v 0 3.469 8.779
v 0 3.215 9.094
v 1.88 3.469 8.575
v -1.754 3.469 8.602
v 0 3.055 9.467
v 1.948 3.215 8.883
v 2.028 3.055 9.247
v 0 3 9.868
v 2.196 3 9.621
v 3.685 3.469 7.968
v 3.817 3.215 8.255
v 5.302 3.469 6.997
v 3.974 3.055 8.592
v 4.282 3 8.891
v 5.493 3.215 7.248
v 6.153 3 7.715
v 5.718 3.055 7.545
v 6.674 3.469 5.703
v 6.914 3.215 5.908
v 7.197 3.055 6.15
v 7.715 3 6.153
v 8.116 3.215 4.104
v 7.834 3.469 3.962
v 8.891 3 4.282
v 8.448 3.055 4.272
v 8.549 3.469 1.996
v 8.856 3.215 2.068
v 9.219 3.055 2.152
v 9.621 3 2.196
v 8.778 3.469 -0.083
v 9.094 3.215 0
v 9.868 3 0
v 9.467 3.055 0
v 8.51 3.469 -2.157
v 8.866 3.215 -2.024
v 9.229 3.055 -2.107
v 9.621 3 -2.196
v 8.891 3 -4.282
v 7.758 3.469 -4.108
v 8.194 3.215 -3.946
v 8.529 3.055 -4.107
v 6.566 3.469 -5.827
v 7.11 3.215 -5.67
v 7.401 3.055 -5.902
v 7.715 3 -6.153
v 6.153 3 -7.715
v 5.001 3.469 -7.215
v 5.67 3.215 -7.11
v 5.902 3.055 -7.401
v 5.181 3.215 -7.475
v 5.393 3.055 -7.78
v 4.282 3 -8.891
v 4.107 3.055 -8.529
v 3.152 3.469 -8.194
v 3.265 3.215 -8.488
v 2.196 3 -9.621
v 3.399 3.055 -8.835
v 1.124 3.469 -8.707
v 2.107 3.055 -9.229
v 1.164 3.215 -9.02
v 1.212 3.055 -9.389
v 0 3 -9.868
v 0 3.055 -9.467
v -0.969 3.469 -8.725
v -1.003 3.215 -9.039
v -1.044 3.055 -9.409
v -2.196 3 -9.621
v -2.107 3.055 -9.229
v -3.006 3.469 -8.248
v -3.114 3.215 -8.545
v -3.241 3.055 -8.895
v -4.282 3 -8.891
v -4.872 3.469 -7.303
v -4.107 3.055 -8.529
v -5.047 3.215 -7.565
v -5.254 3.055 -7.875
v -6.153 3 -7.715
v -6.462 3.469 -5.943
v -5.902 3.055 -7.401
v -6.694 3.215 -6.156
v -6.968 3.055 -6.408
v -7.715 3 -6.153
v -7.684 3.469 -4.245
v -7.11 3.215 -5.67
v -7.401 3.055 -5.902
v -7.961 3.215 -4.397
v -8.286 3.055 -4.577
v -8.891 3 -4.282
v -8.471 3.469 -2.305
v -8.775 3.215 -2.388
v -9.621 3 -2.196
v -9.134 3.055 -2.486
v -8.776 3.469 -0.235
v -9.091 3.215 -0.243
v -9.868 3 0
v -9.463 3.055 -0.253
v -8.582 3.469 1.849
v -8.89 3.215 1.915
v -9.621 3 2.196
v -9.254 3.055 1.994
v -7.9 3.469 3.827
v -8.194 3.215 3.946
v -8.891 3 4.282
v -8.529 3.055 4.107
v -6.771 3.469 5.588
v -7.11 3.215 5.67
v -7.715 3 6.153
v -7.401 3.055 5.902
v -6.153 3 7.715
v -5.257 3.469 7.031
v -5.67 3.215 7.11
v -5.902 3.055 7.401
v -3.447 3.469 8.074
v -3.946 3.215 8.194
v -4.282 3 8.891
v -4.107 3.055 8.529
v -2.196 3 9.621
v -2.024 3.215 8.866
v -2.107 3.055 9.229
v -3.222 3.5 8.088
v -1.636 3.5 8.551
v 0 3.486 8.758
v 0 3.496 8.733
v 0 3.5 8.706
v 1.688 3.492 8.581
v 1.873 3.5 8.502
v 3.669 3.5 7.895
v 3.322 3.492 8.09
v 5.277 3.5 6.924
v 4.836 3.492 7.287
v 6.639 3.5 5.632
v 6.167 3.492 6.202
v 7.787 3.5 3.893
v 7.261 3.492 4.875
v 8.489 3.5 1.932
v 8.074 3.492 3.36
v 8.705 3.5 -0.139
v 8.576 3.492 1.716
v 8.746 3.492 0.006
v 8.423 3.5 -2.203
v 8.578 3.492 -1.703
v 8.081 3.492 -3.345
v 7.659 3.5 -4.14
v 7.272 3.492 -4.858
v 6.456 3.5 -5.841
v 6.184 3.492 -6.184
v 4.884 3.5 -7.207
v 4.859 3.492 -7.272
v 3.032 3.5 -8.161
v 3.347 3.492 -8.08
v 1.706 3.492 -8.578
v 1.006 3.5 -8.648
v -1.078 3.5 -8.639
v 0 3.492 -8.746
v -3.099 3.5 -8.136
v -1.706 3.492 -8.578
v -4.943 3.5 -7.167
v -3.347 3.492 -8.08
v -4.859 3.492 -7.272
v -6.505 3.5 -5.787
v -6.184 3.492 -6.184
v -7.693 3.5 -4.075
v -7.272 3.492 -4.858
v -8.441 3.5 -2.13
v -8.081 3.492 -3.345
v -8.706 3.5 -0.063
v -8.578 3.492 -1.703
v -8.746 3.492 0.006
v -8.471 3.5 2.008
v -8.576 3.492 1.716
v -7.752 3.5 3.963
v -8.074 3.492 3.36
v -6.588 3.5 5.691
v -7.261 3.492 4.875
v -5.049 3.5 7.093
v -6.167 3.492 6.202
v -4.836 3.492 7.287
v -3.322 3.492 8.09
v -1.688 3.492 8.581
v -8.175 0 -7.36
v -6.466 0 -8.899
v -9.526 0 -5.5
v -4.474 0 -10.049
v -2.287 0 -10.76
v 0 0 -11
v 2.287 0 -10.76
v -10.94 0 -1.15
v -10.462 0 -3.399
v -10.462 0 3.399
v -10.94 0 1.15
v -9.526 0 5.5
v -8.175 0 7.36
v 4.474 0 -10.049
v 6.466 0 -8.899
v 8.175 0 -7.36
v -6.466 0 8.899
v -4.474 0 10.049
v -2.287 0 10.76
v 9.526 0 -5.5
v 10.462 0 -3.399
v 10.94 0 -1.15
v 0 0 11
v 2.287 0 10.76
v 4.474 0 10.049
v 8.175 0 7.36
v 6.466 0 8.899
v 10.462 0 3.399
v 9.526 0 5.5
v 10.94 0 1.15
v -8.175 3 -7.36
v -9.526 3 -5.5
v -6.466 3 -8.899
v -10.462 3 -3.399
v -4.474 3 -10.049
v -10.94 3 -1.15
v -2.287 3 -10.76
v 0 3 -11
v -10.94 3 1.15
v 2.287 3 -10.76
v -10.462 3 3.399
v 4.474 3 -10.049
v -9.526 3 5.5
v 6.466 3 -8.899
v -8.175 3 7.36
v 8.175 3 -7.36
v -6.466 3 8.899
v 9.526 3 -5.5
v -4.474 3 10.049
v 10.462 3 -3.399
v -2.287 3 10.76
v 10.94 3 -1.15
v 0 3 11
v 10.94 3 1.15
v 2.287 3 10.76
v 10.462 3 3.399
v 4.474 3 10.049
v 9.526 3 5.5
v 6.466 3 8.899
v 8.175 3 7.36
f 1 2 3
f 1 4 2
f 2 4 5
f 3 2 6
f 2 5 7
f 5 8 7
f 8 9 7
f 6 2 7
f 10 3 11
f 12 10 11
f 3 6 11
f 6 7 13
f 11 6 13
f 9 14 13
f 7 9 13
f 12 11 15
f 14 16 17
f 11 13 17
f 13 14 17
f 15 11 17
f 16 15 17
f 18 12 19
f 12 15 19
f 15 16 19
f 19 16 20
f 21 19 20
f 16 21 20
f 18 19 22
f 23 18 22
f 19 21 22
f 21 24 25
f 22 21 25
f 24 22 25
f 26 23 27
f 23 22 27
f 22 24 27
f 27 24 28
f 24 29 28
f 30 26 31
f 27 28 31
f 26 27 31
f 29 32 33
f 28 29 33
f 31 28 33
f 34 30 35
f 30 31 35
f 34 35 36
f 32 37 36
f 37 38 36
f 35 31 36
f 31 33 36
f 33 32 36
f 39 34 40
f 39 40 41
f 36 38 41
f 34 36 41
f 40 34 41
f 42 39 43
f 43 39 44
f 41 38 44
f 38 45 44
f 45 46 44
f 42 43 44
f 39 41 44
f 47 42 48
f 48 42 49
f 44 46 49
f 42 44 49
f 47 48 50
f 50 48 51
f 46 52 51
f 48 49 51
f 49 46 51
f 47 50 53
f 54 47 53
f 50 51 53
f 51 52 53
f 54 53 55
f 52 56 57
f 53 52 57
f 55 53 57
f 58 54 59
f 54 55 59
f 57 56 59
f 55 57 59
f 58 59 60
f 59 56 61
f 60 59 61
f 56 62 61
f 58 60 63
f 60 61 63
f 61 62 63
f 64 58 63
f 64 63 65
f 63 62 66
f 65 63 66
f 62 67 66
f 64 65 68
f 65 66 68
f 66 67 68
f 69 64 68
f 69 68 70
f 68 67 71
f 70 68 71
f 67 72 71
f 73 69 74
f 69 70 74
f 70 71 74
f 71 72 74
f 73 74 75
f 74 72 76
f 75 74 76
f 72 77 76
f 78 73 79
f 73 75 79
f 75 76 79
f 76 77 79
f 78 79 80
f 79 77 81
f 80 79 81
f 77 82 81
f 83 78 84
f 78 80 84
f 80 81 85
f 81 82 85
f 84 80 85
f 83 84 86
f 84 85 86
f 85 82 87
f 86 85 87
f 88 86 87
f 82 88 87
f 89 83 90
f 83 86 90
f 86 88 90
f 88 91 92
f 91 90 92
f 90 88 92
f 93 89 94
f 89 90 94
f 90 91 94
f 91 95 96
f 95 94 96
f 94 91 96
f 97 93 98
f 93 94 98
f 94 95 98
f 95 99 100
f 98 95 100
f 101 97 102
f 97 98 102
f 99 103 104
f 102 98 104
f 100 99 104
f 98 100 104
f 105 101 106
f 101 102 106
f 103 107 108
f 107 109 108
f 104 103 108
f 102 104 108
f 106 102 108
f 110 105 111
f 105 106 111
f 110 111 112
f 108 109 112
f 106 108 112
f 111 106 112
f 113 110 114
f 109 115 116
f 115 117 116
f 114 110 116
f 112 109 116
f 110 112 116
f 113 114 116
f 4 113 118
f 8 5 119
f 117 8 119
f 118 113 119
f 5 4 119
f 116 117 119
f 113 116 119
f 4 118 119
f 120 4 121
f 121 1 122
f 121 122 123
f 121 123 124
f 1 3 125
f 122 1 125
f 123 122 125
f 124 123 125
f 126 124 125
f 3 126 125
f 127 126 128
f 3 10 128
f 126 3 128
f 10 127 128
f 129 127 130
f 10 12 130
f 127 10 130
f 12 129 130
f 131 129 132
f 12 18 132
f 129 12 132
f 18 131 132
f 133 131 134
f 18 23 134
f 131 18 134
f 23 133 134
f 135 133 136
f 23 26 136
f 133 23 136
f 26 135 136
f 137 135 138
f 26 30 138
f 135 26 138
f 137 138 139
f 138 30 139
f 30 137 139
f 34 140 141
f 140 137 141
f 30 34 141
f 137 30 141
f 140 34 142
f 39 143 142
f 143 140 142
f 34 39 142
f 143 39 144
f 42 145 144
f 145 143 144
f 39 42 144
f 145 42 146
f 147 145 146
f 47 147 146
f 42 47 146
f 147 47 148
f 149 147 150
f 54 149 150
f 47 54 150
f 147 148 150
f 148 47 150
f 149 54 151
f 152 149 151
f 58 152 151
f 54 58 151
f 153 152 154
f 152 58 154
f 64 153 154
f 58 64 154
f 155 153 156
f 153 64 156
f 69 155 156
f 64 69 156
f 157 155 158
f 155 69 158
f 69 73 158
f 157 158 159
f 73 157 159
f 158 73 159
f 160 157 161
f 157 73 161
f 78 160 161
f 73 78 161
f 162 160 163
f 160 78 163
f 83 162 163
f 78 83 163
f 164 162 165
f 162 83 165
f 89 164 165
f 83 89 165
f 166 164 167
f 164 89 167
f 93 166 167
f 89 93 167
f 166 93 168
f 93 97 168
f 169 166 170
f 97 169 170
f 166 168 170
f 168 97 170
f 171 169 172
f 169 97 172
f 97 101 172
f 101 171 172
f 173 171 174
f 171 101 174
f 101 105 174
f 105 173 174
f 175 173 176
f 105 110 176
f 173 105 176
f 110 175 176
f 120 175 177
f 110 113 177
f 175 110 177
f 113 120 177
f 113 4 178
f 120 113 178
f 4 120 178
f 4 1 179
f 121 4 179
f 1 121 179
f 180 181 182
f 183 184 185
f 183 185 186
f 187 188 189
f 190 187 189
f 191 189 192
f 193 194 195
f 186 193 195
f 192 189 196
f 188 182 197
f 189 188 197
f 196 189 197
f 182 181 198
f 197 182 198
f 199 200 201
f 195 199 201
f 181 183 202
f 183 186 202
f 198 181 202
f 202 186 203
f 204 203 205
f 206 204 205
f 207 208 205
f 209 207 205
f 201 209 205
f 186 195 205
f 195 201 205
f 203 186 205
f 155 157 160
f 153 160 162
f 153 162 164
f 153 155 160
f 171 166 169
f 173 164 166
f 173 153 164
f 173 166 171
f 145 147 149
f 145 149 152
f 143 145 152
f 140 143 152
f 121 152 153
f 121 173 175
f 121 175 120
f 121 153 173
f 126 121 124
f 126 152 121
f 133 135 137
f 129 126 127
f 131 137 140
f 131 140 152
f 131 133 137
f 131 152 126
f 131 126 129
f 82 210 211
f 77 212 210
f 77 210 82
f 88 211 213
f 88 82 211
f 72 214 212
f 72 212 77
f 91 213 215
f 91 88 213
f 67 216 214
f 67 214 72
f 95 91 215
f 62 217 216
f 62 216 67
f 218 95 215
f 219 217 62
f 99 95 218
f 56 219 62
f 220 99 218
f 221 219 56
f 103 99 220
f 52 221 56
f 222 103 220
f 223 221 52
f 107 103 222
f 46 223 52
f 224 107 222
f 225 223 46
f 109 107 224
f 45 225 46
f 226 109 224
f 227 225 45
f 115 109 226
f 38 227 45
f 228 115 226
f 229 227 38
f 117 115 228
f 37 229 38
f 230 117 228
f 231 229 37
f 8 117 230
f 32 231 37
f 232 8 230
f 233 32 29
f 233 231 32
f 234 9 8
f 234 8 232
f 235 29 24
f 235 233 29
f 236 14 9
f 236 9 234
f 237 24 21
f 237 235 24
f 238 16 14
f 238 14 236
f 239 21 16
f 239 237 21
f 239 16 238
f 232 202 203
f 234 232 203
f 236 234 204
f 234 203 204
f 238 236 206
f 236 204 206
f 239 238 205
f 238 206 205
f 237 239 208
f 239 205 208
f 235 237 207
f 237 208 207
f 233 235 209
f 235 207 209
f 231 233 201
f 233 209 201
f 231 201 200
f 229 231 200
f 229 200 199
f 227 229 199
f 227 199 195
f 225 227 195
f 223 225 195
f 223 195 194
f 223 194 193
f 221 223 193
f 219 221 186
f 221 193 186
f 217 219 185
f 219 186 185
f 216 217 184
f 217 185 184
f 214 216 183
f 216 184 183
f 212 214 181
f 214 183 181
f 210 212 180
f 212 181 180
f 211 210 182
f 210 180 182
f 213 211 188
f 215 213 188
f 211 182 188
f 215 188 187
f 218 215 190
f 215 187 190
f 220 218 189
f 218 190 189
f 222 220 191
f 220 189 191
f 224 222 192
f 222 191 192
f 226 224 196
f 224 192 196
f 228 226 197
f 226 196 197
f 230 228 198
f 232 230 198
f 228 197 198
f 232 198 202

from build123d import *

# Parameters (mm, degrees)
SKETCH_1_R      = 11
EXTRUDE_1_DEPTH = 3
SKETCH_2_R      = 8.75
EXTRUDE_2_DEPTH = 0.5
FILLET_1_R      = 1.5
FILLET_2_R      = 0.1


with BuildPart() as part:
    # 草图1 → 凸台-拉伸1 (new body)
    with BuildSketch(Plane(origin=(0, 0, 0), x_dir=(1, 0, 0), z_dir=(0, 1, 0))):
        with Locations(Location((0, 0, 0), (0, 0, 270))):
            Circle(SKETCH_1_R)
    extrude(amount=EXTRUDE_1_DEPTH)

    # 草图2 → 凸台-拉伸2 (add)
    with BuildSketch(Plane(origin=(0, 3, 0), x_dir=(1, 0, 0), z_dir=(0, 1, 0))):
        with Locations(Location((0, 0, 0), (0, 0, 270))):
            Circle(SKETCH_2_R)
    extrude(amount=EXTRUDE_2_DEPTH)

    # 圆角1
    # the kernel refuses this fillet: 1.5 mm, written as the material it adds along each edge
    with BuildSketch(Plane(origin=(0, 3, 0), x_dir=(0, 0, 1), z_dir=(-1, 0, 0))) as fillet_1_piece_1:
        with BuildLine():
            CenterArc((9.868033989, 1.5), FILLET_1_R, 221.810314896, 48.189685104)
            Line((8.75, 0.5), (8.72763932, 0.48))
            ThreePointArc((8.72763932, 0.48), (8.72, 0.25), (8.72, 0))
            Line((8.72, 0), (8.75, -0.03))
            Line((8.75, -0.03), (9.868033989, -0.03))
            Line((9.868033989, -0.03), (9.868033989, 0))
        make_face()
    revolve(axis=Axis((0, 3, 0), (0, 1, 0)))

    # 圆角2
    fillet_2_edges = [part.edges().sort_by_distance(p)[0] for p in [
        (0, 3.5, -8.75),
    ]]
    fillet(fillet_2_edges, radius=FILLET_2_R)


solid = part.part
